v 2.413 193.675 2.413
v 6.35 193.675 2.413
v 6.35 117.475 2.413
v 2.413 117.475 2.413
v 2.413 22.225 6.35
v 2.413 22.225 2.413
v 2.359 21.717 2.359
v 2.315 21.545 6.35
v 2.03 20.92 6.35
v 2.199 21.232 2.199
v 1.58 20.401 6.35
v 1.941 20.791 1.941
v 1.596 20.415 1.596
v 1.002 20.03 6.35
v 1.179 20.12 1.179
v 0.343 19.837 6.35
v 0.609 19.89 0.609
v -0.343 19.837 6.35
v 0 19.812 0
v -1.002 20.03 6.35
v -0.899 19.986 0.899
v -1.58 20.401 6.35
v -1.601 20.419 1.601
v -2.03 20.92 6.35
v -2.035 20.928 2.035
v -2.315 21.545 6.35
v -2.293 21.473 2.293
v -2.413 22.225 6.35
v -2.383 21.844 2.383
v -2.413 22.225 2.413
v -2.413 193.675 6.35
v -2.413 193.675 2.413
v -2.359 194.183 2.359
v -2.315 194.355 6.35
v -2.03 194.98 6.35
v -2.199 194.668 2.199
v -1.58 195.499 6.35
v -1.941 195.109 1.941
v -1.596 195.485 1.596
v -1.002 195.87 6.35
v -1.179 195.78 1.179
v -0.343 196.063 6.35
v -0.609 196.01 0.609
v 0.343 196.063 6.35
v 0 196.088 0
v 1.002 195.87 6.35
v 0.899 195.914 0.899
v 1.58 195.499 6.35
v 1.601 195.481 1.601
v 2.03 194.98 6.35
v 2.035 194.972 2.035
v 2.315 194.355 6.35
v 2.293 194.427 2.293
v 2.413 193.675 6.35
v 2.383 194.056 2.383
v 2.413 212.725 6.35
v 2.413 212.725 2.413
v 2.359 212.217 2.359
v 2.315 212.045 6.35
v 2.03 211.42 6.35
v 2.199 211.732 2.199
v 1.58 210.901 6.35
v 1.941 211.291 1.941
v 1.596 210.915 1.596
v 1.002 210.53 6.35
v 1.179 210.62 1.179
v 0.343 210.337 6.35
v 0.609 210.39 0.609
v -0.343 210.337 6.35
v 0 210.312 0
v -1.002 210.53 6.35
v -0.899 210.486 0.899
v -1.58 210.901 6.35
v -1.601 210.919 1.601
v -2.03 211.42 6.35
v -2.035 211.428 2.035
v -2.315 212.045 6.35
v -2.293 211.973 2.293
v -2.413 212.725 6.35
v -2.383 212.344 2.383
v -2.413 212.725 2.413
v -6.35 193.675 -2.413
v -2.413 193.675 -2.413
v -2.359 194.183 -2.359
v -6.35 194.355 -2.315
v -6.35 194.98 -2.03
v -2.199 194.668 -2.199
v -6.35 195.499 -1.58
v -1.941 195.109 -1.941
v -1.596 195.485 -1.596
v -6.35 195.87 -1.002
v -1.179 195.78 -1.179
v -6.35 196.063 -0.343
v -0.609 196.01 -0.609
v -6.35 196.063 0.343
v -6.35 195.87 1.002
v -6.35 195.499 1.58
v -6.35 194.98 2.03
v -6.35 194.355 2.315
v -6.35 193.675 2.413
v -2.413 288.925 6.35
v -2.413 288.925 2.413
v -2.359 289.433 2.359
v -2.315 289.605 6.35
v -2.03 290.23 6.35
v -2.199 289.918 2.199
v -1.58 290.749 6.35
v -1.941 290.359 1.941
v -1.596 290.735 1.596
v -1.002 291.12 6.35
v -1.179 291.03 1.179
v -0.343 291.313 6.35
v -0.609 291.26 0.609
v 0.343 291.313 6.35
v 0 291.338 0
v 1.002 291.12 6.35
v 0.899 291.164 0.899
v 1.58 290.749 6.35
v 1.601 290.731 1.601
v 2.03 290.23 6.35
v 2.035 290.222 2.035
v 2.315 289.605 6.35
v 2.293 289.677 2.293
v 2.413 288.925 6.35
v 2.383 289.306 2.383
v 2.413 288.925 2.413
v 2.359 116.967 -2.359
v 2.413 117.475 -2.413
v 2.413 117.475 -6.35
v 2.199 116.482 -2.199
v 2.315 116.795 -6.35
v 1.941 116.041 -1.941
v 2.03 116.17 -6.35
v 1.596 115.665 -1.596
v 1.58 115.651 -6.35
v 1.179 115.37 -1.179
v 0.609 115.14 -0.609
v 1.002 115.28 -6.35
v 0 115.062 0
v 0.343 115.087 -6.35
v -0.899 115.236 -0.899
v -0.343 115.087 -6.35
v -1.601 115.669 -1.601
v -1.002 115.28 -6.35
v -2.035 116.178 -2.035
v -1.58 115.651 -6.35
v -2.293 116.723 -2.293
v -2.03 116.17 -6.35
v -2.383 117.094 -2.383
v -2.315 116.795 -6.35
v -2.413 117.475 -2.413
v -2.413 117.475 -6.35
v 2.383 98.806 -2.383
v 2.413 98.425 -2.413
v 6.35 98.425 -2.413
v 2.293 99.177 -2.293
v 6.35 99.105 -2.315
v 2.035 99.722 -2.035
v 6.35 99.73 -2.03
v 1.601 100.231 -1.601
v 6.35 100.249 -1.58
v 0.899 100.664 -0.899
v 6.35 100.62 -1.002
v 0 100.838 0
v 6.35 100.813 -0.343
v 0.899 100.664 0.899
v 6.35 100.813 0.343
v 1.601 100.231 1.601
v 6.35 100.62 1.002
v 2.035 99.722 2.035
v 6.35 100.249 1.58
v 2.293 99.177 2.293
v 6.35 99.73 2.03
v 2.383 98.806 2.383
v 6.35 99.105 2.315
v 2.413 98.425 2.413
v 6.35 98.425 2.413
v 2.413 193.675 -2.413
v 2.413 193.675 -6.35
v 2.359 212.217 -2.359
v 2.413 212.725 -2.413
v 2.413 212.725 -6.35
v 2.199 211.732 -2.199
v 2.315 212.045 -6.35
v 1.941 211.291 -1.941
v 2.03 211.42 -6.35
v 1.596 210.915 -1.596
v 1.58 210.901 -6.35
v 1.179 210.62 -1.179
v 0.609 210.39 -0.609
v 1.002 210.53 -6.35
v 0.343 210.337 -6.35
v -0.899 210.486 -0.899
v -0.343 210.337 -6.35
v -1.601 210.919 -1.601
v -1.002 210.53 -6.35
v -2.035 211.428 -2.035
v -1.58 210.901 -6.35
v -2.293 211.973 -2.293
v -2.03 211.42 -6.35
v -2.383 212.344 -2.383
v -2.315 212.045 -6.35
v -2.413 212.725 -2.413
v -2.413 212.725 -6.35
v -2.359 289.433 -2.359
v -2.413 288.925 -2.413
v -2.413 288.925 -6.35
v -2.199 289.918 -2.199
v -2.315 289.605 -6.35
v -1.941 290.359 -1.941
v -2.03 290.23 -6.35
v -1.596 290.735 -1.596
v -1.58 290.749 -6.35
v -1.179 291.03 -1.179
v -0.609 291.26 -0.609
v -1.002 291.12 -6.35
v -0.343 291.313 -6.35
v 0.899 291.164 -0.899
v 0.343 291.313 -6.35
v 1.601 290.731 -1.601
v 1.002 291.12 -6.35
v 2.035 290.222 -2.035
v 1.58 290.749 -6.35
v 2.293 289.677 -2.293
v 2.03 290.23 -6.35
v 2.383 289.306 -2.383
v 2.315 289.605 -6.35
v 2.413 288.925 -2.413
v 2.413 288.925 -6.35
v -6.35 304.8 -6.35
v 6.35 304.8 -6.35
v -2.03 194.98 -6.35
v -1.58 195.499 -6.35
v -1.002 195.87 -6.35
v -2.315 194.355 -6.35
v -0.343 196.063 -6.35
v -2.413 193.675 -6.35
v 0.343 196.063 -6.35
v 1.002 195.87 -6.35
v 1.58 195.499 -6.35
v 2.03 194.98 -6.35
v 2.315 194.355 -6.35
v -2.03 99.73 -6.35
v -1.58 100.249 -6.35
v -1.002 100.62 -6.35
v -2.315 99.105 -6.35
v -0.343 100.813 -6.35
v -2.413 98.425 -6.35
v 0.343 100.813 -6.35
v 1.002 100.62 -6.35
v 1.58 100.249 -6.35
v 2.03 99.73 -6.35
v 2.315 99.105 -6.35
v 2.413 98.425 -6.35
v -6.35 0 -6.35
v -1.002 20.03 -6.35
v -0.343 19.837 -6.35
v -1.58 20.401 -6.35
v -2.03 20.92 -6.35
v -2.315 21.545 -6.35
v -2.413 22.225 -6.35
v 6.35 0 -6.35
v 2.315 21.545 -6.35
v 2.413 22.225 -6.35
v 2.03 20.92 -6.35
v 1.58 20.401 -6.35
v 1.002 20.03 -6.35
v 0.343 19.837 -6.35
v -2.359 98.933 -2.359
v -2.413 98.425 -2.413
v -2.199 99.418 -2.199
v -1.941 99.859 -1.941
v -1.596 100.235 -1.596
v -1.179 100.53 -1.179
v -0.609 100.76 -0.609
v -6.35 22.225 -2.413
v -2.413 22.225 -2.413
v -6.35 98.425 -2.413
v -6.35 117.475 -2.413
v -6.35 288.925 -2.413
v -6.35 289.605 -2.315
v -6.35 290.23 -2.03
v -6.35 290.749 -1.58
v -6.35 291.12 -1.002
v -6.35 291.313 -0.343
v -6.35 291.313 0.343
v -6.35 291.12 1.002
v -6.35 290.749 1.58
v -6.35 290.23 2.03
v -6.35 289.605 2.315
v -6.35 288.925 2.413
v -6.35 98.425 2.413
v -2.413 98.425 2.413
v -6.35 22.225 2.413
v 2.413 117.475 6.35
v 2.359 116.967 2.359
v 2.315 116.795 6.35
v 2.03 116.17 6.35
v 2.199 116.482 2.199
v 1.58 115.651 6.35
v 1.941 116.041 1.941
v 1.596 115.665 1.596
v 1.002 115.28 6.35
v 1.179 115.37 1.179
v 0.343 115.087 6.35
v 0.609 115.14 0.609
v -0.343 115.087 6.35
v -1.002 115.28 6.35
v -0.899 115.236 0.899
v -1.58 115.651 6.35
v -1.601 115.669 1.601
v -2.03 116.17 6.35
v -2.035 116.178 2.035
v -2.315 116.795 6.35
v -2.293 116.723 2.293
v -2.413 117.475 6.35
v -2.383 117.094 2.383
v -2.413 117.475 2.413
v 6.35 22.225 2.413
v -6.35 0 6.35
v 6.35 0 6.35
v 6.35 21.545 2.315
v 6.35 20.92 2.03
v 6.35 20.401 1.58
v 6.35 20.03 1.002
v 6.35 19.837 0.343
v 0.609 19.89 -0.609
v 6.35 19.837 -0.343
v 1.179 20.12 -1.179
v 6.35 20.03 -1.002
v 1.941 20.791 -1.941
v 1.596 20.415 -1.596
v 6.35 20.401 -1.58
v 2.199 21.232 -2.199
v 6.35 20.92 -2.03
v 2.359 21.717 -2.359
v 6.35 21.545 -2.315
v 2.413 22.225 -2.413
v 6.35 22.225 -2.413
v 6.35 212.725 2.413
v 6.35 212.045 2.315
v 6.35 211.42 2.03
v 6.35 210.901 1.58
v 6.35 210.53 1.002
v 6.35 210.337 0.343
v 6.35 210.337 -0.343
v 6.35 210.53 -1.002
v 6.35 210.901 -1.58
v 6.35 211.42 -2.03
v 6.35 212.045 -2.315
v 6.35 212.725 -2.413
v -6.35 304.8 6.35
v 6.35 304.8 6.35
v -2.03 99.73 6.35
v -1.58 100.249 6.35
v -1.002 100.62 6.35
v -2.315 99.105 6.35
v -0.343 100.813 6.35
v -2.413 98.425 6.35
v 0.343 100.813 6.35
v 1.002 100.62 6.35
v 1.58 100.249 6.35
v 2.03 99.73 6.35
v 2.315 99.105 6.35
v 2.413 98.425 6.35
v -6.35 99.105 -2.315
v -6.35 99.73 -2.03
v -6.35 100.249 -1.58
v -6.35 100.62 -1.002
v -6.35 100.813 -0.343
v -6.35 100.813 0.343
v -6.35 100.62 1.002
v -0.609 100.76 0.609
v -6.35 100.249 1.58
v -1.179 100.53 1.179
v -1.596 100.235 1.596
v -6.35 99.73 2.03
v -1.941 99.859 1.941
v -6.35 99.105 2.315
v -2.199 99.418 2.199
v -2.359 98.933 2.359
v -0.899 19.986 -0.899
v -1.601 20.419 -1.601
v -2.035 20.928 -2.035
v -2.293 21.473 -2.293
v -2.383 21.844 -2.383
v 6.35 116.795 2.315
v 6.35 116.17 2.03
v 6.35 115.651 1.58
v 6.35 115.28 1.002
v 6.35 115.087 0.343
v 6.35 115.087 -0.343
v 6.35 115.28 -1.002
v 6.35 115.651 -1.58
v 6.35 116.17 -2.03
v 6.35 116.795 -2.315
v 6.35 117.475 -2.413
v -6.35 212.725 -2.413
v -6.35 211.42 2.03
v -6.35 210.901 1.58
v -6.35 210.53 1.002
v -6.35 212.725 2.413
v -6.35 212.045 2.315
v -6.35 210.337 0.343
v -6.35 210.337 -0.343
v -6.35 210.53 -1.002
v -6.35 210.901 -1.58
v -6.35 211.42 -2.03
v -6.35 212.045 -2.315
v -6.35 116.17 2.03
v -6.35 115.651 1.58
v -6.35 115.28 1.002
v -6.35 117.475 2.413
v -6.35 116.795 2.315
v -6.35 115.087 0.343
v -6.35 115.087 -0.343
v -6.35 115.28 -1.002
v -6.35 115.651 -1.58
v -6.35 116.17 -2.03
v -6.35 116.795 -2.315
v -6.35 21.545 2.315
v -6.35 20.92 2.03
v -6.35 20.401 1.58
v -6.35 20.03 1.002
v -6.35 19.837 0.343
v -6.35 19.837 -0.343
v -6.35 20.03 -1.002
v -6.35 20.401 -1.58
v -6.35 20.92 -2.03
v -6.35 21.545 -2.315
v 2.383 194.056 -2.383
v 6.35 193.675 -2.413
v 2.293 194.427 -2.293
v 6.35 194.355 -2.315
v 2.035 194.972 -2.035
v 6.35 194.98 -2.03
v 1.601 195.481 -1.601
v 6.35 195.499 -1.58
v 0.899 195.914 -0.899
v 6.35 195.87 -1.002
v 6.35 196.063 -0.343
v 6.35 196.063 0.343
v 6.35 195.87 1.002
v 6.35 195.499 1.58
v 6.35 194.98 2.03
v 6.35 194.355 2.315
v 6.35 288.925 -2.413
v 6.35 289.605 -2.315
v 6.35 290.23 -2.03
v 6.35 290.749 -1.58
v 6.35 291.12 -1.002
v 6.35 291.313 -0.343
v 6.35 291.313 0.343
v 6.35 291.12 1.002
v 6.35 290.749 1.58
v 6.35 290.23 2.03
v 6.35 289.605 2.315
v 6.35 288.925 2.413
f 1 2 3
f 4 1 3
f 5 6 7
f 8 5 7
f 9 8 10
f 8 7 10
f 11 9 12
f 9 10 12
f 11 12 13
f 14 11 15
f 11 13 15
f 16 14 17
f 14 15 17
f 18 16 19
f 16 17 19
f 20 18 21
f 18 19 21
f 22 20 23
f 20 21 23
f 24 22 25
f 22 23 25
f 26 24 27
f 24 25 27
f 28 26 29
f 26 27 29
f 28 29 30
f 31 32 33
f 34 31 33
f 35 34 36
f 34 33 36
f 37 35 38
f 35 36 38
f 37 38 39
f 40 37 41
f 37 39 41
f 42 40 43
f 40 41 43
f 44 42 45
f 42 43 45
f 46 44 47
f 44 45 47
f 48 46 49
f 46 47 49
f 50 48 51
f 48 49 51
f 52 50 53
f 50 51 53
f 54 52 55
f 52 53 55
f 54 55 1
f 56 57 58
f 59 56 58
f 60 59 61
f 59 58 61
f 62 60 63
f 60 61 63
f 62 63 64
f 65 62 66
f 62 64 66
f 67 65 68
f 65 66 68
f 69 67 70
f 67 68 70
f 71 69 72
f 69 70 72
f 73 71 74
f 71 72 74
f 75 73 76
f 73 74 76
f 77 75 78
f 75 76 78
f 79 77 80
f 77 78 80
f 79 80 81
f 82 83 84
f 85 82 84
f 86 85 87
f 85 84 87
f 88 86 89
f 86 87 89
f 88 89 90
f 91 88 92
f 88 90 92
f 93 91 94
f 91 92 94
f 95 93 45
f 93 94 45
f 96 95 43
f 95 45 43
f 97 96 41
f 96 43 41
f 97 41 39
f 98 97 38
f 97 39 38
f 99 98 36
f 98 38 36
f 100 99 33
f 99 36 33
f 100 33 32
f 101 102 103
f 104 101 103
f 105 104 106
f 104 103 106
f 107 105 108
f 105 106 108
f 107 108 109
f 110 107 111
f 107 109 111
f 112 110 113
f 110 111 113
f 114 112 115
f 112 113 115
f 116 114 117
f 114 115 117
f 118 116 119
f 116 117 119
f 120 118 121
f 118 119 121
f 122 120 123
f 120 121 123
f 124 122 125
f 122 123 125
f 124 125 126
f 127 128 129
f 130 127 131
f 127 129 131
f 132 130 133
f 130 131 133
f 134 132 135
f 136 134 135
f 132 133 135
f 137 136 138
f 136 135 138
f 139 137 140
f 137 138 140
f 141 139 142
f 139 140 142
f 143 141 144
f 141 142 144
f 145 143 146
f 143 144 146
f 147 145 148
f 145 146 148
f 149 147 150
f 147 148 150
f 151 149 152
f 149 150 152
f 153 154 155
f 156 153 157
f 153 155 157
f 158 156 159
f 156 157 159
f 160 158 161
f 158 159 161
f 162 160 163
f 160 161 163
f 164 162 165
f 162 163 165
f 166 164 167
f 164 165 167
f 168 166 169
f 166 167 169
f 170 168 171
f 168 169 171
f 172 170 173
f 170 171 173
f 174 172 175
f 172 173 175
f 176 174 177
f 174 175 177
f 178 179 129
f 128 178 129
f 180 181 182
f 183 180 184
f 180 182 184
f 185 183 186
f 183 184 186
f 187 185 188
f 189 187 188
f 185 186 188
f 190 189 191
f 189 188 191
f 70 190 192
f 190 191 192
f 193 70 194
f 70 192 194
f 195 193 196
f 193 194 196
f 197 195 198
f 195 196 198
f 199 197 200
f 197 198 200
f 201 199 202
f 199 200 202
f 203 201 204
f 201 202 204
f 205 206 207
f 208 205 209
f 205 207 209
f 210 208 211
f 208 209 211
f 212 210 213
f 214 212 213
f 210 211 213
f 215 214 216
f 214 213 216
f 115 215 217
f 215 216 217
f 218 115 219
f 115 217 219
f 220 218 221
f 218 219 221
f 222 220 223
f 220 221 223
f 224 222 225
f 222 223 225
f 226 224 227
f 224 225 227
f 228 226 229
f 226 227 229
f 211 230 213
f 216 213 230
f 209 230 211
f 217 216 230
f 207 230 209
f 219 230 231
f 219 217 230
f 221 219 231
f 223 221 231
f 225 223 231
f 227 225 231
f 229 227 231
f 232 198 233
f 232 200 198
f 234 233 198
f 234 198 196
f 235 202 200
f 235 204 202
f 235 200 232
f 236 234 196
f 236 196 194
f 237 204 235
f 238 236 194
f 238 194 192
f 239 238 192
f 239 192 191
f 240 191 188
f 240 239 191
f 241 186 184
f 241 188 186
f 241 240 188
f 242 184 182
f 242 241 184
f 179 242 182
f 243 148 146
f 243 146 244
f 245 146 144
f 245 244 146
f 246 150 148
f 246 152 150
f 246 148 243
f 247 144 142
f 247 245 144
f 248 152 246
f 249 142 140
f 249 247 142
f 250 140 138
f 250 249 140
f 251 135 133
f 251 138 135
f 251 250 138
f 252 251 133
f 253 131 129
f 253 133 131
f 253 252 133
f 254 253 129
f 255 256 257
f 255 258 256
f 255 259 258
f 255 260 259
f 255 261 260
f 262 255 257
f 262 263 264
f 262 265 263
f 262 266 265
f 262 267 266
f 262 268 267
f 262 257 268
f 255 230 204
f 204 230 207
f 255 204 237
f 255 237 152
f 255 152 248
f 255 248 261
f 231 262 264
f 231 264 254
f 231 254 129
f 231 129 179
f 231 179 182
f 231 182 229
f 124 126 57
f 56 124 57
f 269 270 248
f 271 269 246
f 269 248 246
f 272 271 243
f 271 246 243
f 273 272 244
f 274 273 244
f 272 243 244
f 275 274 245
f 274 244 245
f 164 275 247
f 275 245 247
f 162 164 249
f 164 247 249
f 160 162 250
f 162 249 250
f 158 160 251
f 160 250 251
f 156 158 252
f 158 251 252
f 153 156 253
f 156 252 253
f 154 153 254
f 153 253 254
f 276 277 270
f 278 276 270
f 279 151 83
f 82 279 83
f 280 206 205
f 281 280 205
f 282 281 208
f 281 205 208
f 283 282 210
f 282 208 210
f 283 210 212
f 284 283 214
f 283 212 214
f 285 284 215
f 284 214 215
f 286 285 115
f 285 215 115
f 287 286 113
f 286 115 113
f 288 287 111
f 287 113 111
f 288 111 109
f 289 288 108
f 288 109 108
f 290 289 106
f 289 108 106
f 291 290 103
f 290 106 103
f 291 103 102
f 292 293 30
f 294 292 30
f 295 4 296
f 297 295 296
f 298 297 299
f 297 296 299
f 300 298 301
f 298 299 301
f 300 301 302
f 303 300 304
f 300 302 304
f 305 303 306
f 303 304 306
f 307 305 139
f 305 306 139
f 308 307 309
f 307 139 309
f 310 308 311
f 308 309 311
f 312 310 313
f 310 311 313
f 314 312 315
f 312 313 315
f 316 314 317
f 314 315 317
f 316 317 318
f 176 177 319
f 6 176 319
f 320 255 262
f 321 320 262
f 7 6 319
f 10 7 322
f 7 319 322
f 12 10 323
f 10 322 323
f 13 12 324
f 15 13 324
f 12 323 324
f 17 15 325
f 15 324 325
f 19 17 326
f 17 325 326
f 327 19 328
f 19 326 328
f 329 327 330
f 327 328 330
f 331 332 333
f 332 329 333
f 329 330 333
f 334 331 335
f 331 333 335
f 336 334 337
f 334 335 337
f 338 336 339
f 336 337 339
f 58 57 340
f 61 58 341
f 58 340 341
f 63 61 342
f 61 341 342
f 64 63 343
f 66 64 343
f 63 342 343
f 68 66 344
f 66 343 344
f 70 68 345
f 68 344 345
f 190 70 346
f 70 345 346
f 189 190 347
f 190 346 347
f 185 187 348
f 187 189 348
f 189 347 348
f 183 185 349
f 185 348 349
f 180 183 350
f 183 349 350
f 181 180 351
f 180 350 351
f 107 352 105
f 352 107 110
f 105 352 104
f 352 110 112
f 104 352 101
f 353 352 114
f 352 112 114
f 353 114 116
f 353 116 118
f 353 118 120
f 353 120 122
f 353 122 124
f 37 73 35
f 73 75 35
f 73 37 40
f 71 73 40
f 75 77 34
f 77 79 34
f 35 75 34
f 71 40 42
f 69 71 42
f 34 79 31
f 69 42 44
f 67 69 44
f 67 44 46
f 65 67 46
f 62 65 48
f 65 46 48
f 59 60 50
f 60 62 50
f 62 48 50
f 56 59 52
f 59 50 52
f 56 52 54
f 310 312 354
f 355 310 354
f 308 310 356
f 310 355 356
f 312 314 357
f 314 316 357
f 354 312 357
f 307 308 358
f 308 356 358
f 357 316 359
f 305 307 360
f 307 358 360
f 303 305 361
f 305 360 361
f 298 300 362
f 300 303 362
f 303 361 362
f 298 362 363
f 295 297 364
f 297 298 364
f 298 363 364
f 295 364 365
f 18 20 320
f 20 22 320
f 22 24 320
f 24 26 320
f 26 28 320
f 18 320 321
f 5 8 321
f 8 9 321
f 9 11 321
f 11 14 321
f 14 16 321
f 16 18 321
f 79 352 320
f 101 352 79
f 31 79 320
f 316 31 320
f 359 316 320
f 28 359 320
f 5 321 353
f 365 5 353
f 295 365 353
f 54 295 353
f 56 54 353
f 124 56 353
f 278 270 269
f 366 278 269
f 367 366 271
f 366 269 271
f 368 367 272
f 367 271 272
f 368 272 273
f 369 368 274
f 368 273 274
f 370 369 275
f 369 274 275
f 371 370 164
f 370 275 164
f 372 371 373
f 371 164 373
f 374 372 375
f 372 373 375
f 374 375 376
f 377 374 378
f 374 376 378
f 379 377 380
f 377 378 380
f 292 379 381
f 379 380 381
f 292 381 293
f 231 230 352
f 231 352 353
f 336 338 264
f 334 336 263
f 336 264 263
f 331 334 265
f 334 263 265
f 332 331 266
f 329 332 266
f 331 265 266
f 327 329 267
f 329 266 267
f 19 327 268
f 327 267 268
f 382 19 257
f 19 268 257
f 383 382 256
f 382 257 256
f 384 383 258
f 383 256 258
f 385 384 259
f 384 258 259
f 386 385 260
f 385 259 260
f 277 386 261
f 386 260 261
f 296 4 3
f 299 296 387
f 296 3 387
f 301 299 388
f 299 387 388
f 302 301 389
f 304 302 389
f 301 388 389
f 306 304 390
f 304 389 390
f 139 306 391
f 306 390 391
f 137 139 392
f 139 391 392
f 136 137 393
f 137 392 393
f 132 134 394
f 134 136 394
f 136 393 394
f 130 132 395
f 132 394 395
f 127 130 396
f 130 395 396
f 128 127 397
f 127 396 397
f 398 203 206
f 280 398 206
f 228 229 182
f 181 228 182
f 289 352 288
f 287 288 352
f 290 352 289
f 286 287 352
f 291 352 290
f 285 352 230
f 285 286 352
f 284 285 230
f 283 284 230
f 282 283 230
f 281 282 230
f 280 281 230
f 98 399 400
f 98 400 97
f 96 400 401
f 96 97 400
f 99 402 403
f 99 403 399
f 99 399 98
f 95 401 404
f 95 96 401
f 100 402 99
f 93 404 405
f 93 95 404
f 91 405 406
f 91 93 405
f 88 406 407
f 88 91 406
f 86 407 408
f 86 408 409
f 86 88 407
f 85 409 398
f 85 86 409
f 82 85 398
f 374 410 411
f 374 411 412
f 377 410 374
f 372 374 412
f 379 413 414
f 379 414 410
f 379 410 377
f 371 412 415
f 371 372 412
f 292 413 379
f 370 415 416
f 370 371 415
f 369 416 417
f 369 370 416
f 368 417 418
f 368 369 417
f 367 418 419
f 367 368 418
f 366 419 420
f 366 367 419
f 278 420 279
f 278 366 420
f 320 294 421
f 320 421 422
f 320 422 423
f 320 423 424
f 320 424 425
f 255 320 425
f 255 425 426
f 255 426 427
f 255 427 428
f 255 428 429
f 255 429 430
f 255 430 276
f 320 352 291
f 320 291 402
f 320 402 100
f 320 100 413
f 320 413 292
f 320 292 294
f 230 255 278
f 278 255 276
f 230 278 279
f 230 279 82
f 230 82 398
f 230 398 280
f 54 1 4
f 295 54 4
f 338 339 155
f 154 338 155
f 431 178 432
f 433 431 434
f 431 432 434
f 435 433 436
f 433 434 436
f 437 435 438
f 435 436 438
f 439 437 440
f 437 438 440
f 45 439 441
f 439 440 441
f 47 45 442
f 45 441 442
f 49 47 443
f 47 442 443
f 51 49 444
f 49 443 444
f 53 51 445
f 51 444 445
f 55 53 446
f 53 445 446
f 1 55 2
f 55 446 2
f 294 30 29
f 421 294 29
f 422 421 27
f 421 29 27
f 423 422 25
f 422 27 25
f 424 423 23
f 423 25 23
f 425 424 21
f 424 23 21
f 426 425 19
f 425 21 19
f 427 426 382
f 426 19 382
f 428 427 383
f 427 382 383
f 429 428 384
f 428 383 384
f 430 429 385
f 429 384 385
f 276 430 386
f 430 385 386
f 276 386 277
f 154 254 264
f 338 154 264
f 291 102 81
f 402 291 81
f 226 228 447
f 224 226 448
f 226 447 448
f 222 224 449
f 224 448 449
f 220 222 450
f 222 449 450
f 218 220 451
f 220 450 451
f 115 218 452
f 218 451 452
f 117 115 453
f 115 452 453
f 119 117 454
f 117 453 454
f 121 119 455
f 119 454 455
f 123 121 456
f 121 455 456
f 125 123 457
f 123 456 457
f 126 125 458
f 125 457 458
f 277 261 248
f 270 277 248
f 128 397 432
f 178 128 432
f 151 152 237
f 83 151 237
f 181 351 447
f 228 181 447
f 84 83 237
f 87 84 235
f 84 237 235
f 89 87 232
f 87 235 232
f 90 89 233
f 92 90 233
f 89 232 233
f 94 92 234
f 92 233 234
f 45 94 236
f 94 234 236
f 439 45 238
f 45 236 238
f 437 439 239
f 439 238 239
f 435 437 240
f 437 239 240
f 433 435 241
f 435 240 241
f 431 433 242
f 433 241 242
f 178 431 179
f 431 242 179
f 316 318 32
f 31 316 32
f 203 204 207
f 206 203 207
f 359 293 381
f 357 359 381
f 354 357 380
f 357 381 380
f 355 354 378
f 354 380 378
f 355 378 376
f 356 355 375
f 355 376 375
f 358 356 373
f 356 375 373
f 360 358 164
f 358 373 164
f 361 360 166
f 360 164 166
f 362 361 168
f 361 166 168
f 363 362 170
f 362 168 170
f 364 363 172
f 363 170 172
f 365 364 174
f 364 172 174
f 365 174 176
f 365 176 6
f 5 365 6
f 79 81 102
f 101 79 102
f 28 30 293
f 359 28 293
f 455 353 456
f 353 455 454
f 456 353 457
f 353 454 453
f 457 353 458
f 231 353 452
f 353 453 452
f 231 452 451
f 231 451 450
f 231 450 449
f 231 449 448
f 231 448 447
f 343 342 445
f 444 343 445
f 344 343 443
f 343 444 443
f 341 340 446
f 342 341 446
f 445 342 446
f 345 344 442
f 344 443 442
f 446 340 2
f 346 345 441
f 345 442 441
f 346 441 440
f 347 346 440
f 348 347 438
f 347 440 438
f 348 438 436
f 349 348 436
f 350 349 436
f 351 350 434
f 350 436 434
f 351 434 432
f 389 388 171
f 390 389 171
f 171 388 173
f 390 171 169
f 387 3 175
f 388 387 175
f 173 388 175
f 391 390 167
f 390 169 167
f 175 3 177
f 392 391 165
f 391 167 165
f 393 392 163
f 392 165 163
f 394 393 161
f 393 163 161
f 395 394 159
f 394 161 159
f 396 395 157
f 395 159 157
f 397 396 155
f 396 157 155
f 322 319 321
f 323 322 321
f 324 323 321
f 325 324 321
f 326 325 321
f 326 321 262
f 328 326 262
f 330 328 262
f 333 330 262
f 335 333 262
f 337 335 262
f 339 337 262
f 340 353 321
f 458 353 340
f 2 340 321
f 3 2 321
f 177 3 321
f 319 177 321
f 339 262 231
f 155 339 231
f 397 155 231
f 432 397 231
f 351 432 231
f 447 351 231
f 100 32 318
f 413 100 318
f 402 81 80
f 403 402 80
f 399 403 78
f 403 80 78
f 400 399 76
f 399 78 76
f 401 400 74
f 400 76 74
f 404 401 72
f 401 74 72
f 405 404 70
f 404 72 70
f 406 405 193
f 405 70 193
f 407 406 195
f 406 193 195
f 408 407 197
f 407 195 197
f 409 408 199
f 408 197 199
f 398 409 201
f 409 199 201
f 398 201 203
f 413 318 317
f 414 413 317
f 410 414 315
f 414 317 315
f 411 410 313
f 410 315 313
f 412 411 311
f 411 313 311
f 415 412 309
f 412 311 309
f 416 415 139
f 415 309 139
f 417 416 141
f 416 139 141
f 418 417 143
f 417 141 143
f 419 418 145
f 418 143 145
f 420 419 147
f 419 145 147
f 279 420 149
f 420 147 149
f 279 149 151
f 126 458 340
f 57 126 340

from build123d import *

# Parameters (mm, degrees)
SKETCH1_W           = 12.7
SKETCH1_H           = 12.7
BOSS_EXTRUDE1_DEPTH = 304.8
CUT_EXTRUDE1_DEPTH  = 13.7
CUT_EXTRUDE2_DEPTH  = 13.7
LPATTERN1_COUNT     = 3
LPATTERN1_PITCH     = 95.25


with BuildPart() as part:
    # Sketch1 → Boss-Extrude1 (new body)
    with BuildSketch(Plane(origin=(0, 0, 0), x_dir=(1, 0, 0), z_dir=(0, 1, 0))):
        Rectangle(SKETCH1_W, SKETCH1_H)
    extrude(amount=BOSS_EXTRUDE1_DEPTH)

    # Sketch2 → Cut-Extrude1 (cut, through all)
    with BuildSketch(Plane(origin=(0, 0, -6.35), x_dir=(-1, 0, 0), z_dir=(0, 0, -1))):
        with BuildLine():
            Line((-2.413, 288.925), (-2.413, 212.725))
            ThreePointArc((-2.413, 212.725), (0, 210.312), (2.413, 212.725))
            Line((2.413, 212.725), (2.413, 288.925))
            ThreePointArc((2.413, 288.925), (0, 291.338), (-2.413, 288.925))
        make_face()
    cut_extrude1 = extrude(amount=-CUT_EXTRUDE1_DEPTH, mode=Mode.SUBTRACT)

    # Sketch3 → Cut-Extrude2 (cut, through all)
    with BuildSketch(Plane(origin=(6.35, 0, 0), x_dir=(0, 0, -1), z_dir=(1, 0, 0))):
        with BuildLine():
            Line((-2.413, 288.925), (-2.413, 212.725))
            ThreePointArc((-2.413, 212.725), (0, 210.312), (2.413, 212.725))
            Line((2.413, 212.725), (2.413, 288.925))
            ThreePointArc((2.413, 288.925), (0, 291.338), (-2.413, 288.925))
        make_face()
    cut_extrude2 = extrude(amount=-CUT_EXTRUDE2_DEPTH, mode=Mode.SUBTRACT)

    # LPattern1: Cut-Extrude1, Cut-Extrude2 ×3
    with Locations(*[(0, -i * LPATTERN1_PITCH, 0) for i in range(1, LPATTERN1_COUNT)]):
        add(cut_extrude1, mode=Mode.SUBTRACT)
        add(cut_extrude2, mode=Mode.SUBTRACT)


solid = part.part
